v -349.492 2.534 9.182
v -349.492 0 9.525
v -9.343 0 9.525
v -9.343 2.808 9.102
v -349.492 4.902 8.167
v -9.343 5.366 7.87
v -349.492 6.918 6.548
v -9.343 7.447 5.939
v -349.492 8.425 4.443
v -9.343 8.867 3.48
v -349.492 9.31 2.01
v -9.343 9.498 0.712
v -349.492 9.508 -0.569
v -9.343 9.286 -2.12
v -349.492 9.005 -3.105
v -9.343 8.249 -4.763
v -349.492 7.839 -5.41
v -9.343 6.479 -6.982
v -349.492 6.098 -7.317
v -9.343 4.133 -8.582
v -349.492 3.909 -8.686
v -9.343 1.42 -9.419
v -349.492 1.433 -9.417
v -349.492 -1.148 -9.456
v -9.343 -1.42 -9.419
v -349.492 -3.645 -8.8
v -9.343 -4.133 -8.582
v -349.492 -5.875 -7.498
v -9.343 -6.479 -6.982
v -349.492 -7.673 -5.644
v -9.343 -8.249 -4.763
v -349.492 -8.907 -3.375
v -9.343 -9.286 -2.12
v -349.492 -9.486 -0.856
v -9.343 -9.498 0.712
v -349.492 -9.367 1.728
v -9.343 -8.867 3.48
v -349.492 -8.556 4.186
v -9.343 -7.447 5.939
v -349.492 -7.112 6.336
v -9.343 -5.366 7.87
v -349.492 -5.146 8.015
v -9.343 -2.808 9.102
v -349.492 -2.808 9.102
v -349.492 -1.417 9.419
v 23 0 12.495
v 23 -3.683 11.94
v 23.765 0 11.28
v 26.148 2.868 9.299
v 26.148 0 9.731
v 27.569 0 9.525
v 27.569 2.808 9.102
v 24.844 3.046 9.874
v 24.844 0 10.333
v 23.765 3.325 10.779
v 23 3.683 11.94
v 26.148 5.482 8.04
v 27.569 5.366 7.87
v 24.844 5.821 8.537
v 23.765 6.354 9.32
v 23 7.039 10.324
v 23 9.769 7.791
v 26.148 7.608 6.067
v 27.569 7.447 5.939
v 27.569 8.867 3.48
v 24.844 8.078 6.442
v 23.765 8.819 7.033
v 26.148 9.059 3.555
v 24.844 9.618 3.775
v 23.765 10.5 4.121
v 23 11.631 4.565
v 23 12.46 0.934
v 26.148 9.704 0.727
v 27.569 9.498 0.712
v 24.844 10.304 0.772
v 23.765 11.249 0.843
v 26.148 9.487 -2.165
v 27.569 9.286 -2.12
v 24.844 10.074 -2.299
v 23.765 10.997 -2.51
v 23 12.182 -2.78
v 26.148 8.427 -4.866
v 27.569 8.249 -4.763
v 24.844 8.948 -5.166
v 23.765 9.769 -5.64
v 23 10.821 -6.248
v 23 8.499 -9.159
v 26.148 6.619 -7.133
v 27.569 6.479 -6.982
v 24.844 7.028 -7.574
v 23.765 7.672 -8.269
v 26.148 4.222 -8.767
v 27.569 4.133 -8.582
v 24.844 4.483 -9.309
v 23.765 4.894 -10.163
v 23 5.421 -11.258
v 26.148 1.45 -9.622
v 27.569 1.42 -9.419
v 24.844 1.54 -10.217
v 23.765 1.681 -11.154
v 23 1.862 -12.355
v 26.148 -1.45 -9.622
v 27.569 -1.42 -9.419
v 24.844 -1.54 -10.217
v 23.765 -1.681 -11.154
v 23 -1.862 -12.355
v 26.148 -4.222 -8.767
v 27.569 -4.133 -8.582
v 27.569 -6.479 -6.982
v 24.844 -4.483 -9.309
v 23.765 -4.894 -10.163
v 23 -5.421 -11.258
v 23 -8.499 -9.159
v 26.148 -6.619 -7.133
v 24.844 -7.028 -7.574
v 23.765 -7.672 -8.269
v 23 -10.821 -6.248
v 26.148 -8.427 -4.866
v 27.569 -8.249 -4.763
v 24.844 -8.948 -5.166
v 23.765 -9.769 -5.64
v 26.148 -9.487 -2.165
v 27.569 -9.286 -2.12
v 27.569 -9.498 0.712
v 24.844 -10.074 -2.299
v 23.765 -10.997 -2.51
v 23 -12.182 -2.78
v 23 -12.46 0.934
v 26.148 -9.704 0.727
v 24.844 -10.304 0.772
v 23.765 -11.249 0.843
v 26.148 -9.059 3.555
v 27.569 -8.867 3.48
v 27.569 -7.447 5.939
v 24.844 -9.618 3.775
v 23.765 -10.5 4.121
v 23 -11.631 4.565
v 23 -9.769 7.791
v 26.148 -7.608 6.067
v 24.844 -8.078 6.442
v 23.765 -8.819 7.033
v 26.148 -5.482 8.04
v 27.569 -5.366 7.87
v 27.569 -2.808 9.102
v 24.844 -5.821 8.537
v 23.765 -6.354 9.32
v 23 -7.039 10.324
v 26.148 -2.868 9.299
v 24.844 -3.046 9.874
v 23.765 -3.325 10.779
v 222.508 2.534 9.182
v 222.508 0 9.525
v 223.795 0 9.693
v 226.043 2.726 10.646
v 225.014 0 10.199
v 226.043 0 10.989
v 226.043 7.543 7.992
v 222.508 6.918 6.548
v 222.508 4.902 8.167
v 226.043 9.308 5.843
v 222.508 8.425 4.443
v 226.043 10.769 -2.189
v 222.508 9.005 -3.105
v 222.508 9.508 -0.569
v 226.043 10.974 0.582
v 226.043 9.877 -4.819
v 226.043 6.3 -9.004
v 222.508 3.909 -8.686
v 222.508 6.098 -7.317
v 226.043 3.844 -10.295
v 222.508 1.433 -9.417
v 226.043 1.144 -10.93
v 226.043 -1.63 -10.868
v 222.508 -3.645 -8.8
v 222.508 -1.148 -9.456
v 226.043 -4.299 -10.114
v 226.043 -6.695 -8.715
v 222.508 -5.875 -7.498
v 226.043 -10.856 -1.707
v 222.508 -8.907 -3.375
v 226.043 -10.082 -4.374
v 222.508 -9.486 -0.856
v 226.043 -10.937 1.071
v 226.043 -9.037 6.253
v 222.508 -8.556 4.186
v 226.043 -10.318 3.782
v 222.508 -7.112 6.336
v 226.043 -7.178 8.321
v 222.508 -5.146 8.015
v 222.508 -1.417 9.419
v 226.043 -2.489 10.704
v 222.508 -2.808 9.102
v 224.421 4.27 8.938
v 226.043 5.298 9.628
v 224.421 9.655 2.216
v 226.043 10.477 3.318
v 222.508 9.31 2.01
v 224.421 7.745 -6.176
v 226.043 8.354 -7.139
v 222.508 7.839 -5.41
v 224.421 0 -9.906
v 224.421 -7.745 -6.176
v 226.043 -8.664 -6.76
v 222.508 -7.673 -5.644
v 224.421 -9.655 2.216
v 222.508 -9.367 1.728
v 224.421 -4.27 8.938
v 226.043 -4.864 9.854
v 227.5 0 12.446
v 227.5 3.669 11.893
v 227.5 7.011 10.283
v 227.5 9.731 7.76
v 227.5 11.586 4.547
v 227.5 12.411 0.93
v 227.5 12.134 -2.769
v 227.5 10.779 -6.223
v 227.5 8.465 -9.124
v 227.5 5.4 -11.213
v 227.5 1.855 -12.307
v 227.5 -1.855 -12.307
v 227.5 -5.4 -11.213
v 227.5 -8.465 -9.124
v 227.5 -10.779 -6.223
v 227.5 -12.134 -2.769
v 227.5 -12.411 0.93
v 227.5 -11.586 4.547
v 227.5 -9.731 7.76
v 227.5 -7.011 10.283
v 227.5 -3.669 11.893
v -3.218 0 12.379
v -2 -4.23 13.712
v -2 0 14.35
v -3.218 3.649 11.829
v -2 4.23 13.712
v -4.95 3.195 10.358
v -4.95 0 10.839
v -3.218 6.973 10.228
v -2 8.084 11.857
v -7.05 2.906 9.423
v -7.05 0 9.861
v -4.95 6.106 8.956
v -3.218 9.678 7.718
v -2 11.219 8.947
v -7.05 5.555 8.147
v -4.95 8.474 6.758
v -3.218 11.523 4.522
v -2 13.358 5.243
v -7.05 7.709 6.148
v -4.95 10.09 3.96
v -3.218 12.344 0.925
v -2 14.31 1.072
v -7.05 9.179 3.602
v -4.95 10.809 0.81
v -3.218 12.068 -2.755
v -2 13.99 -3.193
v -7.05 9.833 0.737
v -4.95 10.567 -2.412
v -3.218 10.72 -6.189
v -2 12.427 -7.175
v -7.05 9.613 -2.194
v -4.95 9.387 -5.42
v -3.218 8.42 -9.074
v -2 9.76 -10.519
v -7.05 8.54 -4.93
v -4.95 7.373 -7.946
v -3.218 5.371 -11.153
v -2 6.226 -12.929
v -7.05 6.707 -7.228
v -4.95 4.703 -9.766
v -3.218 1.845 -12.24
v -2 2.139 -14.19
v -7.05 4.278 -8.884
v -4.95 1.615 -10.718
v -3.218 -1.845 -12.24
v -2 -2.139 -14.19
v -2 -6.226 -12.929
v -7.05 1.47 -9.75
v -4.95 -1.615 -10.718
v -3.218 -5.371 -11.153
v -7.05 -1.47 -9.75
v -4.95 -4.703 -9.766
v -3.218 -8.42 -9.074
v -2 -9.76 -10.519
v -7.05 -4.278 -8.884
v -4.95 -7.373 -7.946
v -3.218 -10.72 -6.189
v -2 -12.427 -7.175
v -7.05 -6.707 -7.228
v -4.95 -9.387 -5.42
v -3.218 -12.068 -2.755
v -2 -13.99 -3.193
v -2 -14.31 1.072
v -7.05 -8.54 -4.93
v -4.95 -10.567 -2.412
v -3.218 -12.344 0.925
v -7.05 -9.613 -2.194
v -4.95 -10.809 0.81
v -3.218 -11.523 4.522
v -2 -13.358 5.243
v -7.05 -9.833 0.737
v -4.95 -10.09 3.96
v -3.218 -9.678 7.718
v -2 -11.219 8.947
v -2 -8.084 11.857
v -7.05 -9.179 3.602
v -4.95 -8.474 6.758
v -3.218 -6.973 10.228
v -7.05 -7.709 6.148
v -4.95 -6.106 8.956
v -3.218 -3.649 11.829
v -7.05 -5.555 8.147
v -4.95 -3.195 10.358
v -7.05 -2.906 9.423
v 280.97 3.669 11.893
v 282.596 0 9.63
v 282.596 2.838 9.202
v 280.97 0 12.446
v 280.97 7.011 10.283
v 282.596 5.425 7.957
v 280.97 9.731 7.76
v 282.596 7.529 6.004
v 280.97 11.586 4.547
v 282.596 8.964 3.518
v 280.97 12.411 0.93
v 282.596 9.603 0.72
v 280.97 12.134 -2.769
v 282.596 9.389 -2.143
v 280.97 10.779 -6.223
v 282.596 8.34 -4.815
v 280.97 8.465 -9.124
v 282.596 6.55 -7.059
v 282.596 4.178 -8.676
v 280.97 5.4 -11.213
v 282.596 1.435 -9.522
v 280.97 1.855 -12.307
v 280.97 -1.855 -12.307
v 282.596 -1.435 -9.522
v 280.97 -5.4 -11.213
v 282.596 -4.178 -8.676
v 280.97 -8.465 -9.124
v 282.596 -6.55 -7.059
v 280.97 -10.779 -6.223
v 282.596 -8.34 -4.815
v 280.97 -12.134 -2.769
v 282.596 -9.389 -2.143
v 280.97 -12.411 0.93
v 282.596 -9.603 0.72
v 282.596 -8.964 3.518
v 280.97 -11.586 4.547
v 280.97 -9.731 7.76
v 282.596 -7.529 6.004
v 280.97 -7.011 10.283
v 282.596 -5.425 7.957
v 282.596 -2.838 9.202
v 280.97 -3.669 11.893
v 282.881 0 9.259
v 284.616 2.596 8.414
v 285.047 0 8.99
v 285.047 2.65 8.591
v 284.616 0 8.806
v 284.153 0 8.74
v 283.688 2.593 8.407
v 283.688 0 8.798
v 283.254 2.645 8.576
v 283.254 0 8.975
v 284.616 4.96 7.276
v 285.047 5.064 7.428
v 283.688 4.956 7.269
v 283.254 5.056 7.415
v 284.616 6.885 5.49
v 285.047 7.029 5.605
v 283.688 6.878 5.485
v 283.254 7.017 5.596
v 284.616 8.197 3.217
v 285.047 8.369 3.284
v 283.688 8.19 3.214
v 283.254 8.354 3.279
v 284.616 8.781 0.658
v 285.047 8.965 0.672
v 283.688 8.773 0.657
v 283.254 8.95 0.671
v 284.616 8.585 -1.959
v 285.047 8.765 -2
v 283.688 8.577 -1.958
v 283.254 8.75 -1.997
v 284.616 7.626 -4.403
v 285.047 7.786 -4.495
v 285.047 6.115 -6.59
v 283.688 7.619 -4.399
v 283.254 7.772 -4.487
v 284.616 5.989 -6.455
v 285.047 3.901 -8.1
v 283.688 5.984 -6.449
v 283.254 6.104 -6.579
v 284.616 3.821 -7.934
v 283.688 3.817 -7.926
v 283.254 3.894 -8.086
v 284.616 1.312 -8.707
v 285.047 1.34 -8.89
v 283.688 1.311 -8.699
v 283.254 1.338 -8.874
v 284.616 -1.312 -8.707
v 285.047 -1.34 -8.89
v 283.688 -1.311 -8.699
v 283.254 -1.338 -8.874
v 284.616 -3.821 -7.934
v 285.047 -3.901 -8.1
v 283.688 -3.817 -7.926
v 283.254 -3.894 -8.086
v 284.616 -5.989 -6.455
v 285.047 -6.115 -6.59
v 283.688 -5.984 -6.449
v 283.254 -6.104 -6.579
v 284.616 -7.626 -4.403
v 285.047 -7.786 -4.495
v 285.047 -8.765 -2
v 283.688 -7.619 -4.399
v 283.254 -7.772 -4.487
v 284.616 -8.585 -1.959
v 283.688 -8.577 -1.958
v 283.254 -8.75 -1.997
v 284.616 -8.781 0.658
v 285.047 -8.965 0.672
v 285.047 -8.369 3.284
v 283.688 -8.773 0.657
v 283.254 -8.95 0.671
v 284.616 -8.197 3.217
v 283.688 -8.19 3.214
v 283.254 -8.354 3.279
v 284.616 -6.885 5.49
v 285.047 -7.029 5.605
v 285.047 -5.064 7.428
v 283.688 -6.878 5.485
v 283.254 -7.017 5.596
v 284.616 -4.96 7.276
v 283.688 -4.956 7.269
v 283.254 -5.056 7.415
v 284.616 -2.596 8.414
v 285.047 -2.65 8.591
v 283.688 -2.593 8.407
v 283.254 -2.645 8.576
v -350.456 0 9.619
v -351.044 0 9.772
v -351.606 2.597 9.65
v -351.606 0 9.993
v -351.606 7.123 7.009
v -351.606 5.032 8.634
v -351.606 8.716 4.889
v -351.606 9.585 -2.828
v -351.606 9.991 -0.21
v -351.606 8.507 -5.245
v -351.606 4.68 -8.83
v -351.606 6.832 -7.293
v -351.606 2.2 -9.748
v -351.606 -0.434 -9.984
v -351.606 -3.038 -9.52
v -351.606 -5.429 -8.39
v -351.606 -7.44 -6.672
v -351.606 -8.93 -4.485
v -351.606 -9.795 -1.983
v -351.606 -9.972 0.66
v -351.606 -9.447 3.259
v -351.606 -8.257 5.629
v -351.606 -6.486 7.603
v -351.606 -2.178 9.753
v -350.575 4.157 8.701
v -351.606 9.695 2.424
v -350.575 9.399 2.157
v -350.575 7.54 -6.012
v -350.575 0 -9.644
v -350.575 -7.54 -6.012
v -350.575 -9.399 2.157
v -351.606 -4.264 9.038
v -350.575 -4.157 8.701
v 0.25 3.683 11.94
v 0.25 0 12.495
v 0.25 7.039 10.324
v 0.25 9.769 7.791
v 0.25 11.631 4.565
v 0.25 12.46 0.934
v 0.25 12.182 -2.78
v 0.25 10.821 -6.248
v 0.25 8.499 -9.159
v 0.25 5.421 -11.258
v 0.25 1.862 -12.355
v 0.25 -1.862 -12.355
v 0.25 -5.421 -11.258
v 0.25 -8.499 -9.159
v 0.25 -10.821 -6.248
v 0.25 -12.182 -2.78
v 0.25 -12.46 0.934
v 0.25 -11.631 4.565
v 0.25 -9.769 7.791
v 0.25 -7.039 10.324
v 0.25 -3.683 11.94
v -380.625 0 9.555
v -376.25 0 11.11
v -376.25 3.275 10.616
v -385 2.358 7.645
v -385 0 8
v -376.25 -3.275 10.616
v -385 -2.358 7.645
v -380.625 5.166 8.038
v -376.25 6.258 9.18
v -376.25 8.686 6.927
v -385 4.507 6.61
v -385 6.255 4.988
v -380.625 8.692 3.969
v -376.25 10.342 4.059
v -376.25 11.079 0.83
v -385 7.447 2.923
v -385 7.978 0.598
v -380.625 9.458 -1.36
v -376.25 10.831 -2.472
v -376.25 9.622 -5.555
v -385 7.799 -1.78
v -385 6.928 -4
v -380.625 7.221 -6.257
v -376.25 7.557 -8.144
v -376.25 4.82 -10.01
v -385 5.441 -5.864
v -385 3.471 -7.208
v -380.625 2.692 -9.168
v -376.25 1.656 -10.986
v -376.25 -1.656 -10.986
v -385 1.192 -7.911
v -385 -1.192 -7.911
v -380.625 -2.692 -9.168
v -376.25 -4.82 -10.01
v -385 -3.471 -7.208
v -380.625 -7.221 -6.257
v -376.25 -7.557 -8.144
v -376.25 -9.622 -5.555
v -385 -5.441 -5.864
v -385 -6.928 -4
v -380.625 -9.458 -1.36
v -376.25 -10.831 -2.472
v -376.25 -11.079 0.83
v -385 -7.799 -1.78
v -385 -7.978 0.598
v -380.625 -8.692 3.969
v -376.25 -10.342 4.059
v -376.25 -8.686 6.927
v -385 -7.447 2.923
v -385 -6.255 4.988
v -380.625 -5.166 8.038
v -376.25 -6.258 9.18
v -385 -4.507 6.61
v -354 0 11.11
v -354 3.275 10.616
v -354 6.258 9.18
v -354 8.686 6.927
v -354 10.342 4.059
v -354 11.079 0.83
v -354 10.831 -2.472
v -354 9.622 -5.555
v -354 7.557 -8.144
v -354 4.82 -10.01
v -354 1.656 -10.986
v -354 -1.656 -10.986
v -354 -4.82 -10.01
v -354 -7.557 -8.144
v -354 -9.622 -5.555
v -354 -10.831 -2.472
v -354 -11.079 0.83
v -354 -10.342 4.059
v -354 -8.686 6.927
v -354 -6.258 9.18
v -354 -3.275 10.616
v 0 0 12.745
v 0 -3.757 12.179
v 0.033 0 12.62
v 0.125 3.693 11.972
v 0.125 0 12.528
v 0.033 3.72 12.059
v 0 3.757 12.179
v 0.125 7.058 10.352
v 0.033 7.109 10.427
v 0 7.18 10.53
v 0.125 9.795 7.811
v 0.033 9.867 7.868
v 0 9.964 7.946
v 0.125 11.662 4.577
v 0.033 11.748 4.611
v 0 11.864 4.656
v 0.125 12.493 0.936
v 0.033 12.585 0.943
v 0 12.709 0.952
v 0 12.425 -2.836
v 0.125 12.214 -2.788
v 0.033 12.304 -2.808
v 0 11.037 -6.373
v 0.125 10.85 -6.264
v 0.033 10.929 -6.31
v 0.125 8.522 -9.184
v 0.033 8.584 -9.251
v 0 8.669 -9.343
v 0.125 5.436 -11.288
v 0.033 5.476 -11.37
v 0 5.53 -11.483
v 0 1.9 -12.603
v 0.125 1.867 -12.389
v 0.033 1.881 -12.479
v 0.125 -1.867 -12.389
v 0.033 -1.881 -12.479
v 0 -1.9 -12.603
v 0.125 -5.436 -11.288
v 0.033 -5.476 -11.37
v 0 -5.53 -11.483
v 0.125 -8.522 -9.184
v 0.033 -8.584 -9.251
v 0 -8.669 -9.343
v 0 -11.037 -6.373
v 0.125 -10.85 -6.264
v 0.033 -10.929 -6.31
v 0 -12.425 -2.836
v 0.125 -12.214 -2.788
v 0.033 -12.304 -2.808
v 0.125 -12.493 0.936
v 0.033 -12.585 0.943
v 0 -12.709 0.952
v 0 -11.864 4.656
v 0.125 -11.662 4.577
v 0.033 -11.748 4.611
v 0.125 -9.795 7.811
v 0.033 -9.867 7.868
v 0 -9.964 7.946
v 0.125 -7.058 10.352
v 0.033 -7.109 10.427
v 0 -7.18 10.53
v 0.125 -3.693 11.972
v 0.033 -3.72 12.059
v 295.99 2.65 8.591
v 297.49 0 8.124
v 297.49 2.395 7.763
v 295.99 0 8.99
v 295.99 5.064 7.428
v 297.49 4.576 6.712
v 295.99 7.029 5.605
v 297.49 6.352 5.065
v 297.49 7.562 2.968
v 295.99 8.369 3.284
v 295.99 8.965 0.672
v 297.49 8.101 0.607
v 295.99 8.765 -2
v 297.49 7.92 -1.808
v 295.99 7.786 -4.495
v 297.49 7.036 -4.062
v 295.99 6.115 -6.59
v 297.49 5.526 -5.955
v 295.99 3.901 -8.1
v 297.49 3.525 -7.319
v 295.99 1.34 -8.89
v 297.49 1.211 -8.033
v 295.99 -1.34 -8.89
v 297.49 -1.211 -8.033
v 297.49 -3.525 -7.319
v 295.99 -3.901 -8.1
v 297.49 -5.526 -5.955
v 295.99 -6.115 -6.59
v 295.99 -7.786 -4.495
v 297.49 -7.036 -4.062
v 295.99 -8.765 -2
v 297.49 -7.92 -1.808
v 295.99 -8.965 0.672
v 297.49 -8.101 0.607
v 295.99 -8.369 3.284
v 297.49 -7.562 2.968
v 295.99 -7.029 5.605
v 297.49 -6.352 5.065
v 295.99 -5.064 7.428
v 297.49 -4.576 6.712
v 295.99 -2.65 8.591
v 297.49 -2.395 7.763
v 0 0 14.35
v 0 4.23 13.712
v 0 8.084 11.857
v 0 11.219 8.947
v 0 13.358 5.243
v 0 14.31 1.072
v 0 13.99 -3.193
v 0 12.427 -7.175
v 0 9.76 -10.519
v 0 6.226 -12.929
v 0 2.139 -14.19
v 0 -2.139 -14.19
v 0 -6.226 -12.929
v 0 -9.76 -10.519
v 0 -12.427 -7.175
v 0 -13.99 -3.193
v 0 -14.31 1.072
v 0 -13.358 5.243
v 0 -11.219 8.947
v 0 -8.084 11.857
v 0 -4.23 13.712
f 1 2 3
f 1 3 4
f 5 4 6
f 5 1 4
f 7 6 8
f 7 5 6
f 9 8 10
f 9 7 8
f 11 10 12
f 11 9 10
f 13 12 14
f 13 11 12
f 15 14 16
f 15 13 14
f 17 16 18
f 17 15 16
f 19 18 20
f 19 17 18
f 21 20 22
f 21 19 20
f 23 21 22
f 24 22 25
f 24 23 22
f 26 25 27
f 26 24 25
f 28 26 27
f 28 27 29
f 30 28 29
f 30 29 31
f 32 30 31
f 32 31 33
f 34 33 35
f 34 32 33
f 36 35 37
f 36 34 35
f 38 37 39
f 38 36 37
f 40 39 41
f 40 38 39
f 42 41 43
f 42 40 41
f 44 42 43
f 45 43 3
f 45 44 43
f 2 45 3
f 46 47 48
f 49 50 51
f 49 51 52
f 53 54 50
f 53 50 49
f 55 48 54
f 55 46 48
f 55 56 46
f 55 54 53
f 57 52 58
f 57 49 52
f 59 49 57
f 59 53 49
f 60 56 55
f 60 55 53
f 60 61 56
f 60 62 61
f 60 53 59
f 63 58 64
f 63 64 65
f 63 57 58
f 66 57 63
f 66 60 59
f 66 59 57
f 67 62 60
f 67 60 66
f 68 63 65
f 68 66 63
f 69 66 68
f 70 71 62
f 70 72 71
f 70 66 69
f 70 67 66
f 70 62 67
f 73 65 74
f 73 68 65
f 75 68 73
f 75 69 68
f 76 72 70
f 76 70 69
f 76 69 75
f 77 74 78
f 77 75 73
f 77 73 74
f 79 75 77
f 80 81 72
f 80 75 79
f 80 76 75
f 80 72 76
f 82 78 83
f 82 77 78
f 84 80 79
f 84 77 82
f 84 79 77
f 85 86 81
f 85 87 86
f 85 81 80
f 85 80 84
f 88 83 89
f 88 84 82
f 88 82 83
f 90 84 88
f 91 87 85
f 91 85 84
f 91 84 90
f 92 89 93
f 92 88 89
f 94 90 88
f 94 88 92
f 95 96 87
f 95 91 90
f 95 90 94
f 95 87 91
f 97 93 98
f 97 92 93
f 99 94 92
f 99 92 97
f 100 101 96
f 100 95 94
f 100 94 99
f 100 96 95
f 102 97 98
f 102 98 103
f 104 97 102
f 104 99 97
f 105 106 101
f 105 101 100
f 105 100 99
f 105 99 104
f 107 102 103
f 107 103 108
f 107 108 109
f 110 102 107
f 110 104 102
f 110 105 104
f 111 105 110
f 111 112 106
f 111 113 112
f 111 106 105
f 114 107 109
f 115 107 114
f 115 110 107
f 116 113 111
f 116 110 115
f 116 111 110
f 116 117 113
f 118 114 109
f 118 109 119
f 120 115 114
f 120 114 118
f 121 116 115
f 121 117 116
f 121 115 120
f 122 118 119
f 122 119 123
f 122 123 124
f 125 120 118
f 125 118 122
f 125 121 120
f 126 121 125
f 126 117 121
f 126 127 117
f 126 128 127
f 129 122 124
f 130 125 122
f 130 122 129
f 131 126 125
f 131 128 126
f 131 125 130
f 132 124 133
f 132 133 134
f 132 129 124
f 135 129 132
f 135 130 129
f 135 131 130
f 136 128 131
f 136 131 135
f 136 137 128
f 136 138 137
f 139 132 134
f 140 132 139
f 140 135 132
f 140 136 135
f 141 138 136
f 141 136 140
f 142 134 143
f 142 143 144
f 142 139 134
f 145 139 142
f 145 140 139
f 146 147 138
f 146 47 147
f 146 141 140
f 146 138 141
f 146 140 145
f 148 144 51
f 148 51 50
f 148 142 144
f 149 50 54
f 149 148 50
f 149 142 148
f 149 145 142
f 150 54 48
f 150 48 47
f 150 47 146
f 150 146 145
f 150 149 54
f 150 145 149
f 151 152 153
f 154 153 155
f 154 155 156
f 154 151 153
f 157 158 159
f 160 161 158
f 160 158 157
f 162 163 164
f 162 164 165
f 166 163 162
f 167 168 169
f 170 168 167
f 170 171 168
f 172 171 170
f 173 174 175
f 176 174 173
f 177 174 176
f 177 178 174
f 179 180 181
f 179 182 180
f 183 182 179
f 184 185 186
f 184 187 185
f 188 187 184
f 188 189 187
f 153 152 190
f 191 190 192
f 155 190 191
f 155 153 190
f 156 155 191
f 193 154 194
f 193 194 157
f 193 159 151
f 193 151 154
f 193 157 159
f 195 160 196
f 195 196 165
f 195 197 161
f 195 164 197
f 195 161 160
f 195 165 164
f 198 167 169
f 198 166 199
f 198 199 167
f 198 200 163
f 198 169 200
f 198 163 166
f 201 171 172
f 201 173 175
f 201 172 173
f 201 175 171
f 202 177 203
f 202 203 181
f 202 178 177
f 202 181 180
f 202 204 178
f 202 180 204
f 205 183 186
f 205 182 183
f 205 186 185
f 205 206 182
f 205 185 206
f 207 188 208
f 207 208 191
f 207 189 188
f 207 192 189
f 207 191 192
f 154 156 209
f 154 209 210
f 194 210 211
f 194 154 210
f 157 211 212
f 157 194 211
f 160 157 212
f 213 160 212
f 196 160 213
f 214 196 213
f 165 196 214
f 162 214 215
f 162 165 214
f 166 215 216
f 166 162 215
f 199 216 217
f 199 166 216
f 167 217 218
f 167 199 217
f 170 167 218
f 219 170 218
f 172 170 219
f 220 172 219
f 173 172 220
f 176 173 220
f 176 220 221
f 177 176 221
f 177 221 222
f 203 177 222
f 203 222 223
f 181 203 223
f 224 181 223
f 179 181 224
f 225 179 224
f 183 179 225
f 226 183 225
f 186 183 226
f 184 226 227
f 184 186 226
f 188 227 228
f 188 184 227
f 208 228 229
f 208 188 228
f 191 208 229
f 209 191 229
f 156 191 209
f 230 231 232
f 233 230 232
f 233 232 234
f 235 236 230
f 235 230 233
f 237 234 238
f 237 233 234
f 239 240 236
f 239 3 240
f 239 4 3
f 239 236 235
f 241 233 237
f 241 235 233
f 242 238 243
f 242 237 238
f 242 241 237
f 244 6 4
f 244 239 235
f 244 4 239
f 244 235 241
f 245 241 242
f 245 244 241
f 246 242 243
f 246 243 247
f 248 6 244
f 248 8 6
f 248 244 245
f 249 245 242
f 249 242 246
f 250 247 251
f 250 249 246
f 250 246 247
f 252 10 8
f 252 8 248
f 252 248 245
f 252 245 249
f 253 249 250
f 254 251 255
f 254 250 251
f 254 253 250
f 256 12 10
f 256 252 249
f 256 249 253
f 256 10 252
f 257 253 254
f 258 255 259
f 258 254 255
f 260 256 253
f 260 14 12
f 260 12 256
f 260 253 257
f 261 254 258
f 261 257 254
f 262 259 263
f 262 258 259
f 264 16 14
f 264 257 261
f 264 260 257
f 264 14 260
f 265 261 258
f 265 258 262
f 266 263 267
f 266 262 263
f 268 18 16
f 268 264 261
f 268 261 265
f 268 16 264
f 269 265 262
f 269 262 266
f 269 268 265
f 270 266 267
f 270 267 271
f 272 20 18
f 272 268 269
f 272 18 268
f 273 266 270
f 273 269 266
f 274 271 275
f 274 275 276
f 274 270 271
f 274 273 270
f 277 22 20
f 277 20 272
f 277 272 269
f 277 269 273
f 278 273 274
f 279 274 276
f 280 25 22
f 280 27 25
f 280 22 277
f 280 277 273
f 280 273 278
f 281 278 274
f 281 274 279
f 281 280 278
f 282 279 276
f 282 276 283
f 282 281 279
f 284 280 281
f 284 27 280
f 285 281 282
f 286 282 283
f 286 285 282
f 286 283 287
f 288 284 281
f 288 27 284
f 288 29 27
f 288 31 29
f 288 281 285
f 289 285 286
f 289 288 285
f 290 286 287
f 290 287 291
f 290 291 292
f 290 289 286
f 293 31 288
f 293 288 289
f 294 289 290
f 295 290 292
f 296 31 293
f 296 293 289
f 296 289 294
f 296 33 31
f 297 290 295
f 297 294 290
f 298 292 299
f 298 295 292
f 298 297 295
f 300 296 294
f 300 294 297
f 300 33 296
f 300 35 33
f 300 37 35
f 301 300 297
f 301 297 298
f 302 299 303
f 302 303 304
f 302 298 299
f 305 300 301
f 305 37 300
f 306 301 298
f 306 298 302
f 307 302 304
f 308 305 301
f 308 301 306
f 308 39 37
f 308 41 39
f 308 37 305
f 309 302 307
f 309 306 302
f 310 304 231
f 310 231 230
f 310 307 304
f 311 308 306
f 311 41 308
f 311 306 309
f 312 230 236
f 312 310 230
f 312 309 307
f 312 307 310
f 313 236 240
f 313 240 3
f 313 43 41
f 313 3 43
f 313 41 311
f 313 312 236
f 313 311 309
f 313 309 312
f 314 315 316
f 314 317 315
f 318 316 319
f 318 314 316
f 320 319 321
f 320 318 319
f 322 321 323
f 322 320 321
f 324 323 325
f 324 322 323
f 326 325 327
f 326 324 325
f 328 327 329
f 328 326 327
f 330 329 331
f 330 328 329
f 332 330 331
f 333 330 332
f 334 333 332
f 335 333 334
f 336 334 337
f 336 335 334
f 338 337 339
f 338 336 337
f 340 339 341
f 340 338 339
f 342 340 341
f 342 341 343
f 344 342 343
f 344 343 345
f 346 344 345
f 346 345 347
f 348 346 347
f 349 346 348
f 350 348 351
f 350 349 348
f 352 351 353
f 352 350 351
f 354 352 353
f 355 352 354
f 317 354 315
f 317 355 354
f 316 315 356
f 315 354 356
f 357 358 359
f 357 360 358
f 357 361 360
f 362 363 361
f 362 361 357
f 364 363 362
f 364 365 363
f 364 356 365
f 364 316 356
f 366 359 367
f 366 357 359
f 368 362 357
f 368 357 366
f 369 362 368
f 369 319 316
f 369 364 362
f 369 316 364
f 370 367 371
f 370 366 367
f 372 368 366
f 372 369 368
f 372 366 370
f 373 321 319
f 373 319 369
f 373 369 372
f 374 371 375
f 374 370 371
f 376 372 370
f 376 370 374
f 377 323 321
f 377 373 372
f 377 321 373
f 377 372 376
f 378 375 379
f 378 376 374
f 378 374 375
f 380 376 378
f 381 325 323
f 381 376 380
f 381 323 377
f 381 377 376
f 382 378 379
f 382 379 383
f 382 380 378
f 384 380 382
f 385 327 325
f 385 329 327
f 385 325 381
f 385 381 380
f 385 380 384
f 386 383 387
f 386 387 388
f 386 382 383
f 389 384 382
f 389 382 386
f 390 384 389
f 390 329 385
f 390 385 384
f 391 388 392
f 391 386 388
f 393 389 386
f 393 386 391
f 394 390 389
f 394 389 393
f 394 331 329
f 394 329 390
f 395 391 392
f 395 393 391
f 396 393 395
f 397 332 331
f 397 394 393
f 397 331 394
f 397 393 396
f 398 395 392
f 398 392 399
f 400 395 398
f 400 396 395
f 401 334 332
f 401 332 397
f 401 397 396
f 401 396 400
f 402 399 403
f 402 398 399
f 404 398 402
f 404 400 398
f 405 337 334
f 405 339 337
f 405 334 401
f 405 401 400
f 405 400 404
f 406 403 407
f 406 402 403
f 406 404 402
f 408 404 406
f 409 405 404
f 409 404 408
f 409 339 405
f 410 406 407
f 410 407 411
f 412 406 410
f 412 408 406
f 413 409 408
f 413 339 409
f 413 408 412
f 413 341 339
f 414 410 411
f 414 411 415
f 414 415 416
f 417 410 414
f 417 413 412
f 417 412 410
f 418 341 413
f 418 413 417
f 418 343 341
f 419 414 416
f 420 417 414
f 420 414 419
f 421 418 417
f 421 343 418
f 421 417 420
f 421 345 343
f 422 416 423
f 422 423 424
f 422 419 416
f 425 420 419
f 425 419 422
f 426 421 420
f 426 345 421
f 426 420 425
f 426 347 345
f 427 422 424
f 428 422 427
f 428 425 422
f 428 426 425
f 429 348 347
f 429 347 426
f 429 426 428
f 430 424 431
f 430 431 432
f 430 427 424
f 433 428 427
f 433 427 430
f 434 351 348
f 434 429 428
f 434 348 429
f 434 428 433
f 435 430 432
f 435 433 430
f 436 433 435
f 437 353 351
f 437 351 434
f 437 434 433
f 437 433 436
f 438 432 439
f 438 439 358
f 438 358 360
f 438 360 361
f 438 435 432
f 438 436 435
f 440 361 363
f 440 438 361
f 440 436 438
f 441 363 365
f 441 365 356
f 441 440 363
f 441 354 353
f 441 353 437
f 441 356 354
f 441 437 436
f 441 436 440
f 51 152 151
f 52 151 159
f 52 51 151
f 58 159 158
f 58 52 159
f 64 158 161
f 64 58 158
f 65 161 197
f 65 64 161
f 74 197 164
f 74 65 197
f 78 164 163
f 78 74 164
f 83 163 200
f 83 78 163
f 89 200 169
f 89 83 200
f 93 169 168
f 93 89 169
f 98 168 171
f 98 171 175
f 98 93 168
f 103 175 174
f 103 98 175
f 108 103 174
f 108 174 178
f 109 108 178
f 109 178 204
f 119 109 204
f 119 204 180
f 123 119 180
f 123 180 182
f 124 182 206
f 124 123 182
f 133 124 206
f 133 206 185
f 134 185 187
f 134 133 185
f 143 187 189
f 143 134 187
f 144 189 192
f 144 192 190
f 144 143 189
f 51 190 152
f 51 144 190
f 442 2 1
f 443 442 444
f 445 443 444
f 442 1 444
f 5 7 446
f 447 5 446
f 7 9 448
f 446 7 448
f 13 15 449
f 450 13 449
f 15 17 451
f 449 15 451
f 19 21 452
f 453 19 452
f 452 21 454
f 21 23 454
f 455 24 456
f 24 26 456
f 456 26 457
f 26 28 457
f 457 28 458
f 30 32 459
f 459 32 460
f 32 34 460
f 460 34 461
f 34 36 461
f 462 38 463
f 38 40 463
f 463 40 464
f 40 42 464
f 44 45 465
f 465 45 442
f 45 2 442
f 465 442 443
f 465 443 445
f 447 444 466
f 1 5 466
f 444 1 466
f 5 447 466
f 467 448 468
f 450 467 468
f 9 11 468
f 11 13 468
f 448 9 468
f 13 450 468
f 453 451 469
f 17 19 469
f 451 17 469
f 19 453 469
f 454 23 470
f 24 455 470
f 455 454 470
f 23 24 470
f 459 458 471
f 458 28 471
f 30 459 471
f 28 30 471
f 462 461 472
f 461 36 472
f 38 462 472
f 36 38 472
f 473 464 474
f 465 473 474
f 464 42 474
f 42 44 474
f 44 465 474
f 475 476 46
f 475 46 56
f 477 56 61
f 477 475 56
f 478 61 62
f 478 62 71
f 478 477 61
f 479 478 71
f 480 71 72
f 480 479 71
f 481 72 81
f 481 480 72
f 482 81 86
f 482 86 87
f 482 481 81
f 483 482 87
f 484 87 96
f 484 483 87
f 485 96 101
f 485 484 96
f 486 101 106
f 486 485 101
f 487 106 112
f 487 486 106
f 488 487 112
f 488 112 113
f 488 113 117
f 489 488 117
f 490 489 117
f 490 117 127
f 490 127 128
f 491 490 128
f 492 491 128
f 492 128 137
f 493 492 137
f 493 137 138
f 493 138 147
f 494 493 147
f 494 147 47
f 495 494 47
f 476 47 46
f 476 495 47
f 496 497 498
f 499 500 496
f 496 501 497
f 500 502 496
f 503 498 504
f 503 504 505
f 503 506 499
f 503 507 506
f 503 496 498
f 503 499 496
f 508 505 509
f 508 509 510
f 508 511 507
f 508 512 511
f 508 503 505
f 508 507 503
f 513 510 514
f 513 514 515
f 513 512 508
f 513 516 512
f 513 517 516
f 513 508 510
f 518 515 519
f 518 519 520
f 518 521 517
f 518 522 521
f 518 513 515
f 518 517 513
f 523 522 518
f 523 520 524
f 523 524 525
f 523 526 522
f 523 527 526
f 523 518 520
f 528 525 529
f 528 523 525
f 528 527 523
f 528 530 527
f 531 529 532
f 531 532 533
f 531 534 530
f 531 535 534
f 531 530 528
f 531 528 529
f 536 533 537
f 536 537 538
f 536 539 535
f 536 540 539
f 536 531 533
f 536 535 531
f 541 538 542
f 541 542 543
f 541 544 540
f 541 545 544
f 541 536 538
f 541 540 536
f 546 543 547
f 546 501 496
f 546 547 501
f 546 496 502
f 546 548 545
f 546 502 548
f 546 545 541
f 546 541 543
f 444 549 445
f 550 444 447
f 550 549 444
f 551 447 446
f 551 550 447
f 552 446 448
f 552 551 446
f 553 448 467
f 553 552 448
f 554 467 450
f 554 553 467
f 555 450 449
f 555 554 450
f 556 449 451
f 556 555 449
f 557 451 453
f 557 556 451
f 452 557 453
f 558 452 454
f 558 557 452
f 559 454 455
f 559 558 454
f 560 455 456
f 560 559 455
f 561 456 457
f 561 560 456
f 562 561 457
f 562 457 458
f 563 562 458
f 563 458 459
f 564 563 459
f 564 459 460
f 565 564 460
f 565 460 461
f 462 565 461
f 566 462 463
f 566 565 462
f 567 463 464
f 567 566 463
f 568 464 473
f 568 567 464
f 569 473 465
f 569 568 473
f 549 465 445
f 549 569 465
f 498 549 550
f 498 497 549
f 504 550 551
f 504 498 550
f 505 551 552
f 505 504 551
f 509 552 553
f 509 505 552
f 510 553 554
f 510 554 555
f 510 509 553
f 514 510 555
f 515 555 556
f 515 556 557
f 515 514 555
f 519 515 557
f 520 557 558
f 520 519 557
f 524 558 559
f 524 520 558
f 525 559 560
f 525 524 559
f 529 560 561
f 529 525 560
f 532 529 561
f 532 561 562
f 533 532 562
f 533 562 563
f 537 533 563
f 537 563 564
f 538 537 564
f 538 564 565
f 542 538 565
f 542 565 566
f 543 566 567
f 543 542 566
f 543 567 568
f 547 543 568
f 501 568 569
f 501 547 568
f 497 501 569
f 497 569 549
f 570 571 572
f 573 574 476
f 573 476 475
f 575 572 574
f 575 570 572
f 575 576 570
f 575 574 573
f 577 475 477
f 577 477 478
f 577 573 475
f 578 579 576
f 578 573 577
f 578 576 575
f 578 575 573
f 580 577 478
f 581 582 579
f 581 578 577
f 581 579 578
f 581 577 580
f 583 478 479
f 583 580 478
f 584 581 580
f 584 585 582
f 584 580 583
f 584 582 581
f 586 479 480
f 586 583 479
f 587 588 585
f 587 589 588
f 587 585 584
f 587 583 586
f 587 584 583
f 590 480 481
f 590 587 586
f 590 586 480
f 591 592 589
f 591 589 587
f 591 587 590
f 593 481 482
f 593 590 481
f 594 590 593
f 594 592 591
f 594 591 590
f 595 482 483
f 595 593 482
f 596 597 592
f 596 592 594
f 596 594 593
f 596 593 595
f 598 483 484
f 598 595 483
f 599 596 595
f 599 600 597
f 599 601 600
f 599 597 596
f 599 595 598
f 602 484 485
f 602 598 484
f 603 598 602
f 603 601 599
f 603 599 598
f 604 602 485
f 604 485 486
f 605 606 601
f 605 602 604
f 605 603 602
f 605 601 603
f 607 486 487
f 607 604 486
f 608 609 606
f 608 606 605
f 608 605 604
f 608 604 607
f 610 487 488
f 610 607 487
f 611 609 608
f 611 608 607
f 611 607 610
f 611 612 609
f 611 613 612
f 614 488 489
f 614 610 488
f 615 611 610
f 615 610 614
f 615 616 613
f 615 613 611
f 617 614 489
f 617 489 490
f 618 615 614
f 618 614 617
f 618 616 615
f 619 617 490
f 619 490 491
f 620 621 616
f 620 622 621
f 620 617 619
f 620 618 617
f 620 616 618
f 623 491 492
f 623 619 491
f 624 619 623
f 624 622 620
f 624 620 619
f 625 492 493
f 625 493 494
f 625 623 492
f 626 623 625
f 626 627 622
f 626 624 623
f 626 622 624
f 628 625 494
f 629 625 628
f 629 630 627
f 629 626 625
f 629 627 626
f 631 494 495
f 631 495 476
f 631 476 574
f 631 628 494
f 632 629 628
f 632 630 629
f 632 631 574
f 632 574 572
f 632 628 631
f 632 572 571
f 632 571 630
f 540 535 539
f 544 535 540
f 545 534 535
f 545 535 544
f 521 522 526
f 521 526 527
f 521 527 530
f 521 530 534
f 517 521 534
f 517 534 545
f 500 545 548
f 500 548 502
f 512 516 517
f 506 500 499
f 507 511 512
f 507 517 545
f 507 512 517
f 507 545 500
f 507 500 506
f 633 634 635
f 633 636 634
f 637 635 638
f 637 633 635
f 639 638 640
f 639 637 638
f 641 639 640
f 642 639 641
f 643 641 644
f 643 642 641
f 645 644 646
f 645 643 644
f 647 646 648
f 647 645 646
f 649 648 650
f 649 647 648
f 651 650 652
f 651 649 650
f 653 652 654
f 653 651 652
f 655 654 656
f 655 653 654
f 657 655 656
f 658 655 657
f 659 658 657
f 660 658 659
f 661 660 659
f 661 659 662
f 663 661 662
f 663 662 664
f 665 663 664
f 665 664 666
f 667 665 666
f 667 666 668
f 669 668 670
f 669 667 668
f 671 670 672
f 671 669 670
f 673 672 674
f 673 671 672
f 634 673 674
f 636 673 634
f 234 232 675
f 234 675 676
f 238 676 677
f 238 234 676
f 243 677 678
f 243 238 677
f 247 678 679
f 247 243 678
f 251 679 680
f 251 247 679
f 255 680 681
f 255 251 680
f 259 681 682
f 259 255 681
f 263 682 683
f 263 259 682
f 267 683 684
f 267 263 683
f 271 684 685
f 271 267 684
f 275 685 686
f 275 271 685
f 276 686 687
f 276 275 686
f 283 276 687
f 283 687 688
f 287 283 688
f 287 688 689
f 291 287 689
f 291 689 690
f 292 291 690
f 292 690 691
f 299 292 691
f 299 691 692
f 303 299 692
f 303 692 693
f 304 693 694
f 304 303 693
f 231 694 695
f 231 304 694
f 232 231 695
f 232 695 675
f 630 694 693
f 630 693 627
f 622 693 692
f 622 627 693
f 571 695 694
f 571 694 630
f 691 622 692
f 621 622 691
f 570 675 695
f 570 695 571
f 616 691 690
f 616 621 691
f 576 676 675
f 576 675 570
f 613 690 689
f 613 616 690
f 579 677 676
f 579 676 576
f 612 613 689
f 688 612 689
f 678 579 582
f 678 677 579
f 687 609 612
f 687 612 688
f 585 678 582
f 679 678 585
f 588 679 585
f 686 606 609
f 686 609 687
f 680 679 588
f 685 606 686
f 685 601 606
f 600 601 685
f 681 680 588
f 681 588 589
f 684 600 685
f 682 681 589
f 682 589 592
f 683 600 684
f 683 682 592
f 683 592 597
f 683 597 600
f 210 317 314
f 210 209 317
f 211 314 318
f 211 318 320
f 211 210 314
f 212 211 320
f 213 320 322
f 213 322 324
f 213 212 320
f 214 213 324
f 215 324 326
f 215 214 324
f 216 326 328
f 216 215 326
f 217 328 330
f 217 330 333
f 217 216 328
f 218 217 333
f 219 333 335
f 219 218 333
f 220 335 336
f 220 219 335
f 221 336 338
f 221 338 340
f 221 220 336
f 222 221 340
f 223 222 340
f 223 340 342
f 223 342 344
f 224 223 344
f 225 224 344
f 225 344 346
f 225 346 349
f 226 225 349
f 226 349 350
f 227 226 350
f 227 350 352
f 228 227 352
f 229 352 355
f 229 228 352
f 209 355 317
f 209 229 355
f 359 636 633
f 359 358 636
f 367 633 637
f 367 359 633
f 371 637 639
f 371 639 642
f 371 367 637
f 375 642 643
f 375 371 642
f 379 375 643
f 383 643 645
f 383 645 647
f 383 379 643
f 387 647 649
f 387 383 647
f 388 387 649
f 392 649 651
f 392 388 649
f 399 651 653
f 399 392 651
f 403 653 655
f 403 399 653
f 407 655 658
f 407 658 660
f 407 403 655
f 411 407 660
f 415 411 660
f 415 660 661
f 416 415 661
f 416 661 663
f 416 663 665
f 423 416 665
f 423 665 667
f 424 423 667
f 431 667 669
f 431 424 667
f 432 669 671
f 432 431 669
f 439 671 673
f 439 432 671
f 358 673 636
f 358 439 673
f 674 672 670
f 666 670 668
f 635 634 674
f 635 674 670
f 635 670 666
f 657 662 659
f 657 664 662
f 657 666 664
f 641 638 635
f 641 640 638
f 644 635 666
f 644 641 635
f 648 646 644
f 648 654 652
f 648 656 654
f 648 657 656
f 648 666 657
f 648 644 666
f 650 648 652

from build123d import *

# Parameters (mm, degrees)
F4_R = 0.25
F5_R = 5
F6_R = 5


# Not quite as in the source:
# - a fillet or chamfer that OpenCascade refuses, or shapes differently, is made with other operations: its cross-section is extruded or revolved along the edge and cut away or added


with BuildPart() as f1:
    # F0 (on Front) → F1 (revolve)
    with BuildSketch(Plane.XZ):
        with BuildLine():
            Line((-2, 9.525), (-350.6009565311, 9.525))
            Line((-350.6009565311, 9.525), (-354, 11.11))
            Line((-354, 11.11), (-376.25, 11.11))
            Line((-376.25, 11.11), (-385, 8))
            Line((-385, 8), (-385, 0))
            Line((-385, 0), (297.49, 0))
            Line((297.49, 0), (297.49, 8.1239745962))
            Line((297.49, 8.1239745962), (295.99, 8.99))
            Line((295.99, 8.99), (285.0470138467, 8.99))
            ThreePointArc((285.0470138467, 8.99), (283.6876657265, 8.797737003), (282.5958183581, 9.63))
            Line((282.5958183581, 9.63), (280.97, 12.446))
            Line((280.97, 12.446), (227.5, 12.446))
            Line((227.5, 12.446), (224.579, 9.525))
            Line((224.579, 9.525), (23, 9.525))
            Line((23, 9.525), (23, 12.495))
            Line((23, 12.495), (0, 12.495))
            Line((0, 12.495), (0, 14.35))
            Line((0, 14.35), (-2, 14.35))
            Line((-2, 14.35), (-2, 9.525))
        make_face()
    revolve(axis=Axis((-43.755, 0, 0), (-1, 0, 0)))

    # F2: fillet of radius 8 on 1 edges, made by hand

    # F2_s1 → F2_t2 (revolve)
    with BuildSketch(Plane.XZ):
        with BuildLine():
            ThreePointArc((-2, 14.35), (-4.9498048155, 10.8391941398), (-9.3429813428, 9.525))
            Line((-9.3429813428, 9.525), (-2, 9.525))
            Line((-2, 9.525), (-2, 14.35))
        make_face()
    revolve(axis=Axis((-2, 0, 0), (-1, 0, 0)))

    # F3: fillet of radius 5 on 1 edges, made by hand

    # F3_s1 → F3_t2 (revolve)
    with BuildSketch(Plane.XZ):
        with BuildLine():
            ThreePointArc((27.5693653826, 9.525), (24.8444800639, 10.3327452367), (23, 12.495))
            Line((23, 12.495), (23, 9.525))
            Line((23, 9.525), (27.5693653826, 9.525))
        make_face()
    revolve(axis=Axis((23, 0, 0), (-1, 0, 0)))

    # F4
    f4_edges = [f1.edges().sort_by_distance(p)[0] for p in [
        (0, 0, -12.495),
    ]]
    fillet(f4_edges, radius=F4_R)

    # F5
    f5_edges = [f1.edges().sort_by_distance(p)[0] for p in [
        (-350.600957, 0, -9.525),
    ]]
    fillet(f5_edges, radius=F5_R)

    # F6
    f6_edges = [f1.edges().sort_by_distance(p)[0] for p in [
        (224.579, 0, -9.525),
    ]]
    fillet(f6_edges, radius=F6_R)


solid = f1.part
